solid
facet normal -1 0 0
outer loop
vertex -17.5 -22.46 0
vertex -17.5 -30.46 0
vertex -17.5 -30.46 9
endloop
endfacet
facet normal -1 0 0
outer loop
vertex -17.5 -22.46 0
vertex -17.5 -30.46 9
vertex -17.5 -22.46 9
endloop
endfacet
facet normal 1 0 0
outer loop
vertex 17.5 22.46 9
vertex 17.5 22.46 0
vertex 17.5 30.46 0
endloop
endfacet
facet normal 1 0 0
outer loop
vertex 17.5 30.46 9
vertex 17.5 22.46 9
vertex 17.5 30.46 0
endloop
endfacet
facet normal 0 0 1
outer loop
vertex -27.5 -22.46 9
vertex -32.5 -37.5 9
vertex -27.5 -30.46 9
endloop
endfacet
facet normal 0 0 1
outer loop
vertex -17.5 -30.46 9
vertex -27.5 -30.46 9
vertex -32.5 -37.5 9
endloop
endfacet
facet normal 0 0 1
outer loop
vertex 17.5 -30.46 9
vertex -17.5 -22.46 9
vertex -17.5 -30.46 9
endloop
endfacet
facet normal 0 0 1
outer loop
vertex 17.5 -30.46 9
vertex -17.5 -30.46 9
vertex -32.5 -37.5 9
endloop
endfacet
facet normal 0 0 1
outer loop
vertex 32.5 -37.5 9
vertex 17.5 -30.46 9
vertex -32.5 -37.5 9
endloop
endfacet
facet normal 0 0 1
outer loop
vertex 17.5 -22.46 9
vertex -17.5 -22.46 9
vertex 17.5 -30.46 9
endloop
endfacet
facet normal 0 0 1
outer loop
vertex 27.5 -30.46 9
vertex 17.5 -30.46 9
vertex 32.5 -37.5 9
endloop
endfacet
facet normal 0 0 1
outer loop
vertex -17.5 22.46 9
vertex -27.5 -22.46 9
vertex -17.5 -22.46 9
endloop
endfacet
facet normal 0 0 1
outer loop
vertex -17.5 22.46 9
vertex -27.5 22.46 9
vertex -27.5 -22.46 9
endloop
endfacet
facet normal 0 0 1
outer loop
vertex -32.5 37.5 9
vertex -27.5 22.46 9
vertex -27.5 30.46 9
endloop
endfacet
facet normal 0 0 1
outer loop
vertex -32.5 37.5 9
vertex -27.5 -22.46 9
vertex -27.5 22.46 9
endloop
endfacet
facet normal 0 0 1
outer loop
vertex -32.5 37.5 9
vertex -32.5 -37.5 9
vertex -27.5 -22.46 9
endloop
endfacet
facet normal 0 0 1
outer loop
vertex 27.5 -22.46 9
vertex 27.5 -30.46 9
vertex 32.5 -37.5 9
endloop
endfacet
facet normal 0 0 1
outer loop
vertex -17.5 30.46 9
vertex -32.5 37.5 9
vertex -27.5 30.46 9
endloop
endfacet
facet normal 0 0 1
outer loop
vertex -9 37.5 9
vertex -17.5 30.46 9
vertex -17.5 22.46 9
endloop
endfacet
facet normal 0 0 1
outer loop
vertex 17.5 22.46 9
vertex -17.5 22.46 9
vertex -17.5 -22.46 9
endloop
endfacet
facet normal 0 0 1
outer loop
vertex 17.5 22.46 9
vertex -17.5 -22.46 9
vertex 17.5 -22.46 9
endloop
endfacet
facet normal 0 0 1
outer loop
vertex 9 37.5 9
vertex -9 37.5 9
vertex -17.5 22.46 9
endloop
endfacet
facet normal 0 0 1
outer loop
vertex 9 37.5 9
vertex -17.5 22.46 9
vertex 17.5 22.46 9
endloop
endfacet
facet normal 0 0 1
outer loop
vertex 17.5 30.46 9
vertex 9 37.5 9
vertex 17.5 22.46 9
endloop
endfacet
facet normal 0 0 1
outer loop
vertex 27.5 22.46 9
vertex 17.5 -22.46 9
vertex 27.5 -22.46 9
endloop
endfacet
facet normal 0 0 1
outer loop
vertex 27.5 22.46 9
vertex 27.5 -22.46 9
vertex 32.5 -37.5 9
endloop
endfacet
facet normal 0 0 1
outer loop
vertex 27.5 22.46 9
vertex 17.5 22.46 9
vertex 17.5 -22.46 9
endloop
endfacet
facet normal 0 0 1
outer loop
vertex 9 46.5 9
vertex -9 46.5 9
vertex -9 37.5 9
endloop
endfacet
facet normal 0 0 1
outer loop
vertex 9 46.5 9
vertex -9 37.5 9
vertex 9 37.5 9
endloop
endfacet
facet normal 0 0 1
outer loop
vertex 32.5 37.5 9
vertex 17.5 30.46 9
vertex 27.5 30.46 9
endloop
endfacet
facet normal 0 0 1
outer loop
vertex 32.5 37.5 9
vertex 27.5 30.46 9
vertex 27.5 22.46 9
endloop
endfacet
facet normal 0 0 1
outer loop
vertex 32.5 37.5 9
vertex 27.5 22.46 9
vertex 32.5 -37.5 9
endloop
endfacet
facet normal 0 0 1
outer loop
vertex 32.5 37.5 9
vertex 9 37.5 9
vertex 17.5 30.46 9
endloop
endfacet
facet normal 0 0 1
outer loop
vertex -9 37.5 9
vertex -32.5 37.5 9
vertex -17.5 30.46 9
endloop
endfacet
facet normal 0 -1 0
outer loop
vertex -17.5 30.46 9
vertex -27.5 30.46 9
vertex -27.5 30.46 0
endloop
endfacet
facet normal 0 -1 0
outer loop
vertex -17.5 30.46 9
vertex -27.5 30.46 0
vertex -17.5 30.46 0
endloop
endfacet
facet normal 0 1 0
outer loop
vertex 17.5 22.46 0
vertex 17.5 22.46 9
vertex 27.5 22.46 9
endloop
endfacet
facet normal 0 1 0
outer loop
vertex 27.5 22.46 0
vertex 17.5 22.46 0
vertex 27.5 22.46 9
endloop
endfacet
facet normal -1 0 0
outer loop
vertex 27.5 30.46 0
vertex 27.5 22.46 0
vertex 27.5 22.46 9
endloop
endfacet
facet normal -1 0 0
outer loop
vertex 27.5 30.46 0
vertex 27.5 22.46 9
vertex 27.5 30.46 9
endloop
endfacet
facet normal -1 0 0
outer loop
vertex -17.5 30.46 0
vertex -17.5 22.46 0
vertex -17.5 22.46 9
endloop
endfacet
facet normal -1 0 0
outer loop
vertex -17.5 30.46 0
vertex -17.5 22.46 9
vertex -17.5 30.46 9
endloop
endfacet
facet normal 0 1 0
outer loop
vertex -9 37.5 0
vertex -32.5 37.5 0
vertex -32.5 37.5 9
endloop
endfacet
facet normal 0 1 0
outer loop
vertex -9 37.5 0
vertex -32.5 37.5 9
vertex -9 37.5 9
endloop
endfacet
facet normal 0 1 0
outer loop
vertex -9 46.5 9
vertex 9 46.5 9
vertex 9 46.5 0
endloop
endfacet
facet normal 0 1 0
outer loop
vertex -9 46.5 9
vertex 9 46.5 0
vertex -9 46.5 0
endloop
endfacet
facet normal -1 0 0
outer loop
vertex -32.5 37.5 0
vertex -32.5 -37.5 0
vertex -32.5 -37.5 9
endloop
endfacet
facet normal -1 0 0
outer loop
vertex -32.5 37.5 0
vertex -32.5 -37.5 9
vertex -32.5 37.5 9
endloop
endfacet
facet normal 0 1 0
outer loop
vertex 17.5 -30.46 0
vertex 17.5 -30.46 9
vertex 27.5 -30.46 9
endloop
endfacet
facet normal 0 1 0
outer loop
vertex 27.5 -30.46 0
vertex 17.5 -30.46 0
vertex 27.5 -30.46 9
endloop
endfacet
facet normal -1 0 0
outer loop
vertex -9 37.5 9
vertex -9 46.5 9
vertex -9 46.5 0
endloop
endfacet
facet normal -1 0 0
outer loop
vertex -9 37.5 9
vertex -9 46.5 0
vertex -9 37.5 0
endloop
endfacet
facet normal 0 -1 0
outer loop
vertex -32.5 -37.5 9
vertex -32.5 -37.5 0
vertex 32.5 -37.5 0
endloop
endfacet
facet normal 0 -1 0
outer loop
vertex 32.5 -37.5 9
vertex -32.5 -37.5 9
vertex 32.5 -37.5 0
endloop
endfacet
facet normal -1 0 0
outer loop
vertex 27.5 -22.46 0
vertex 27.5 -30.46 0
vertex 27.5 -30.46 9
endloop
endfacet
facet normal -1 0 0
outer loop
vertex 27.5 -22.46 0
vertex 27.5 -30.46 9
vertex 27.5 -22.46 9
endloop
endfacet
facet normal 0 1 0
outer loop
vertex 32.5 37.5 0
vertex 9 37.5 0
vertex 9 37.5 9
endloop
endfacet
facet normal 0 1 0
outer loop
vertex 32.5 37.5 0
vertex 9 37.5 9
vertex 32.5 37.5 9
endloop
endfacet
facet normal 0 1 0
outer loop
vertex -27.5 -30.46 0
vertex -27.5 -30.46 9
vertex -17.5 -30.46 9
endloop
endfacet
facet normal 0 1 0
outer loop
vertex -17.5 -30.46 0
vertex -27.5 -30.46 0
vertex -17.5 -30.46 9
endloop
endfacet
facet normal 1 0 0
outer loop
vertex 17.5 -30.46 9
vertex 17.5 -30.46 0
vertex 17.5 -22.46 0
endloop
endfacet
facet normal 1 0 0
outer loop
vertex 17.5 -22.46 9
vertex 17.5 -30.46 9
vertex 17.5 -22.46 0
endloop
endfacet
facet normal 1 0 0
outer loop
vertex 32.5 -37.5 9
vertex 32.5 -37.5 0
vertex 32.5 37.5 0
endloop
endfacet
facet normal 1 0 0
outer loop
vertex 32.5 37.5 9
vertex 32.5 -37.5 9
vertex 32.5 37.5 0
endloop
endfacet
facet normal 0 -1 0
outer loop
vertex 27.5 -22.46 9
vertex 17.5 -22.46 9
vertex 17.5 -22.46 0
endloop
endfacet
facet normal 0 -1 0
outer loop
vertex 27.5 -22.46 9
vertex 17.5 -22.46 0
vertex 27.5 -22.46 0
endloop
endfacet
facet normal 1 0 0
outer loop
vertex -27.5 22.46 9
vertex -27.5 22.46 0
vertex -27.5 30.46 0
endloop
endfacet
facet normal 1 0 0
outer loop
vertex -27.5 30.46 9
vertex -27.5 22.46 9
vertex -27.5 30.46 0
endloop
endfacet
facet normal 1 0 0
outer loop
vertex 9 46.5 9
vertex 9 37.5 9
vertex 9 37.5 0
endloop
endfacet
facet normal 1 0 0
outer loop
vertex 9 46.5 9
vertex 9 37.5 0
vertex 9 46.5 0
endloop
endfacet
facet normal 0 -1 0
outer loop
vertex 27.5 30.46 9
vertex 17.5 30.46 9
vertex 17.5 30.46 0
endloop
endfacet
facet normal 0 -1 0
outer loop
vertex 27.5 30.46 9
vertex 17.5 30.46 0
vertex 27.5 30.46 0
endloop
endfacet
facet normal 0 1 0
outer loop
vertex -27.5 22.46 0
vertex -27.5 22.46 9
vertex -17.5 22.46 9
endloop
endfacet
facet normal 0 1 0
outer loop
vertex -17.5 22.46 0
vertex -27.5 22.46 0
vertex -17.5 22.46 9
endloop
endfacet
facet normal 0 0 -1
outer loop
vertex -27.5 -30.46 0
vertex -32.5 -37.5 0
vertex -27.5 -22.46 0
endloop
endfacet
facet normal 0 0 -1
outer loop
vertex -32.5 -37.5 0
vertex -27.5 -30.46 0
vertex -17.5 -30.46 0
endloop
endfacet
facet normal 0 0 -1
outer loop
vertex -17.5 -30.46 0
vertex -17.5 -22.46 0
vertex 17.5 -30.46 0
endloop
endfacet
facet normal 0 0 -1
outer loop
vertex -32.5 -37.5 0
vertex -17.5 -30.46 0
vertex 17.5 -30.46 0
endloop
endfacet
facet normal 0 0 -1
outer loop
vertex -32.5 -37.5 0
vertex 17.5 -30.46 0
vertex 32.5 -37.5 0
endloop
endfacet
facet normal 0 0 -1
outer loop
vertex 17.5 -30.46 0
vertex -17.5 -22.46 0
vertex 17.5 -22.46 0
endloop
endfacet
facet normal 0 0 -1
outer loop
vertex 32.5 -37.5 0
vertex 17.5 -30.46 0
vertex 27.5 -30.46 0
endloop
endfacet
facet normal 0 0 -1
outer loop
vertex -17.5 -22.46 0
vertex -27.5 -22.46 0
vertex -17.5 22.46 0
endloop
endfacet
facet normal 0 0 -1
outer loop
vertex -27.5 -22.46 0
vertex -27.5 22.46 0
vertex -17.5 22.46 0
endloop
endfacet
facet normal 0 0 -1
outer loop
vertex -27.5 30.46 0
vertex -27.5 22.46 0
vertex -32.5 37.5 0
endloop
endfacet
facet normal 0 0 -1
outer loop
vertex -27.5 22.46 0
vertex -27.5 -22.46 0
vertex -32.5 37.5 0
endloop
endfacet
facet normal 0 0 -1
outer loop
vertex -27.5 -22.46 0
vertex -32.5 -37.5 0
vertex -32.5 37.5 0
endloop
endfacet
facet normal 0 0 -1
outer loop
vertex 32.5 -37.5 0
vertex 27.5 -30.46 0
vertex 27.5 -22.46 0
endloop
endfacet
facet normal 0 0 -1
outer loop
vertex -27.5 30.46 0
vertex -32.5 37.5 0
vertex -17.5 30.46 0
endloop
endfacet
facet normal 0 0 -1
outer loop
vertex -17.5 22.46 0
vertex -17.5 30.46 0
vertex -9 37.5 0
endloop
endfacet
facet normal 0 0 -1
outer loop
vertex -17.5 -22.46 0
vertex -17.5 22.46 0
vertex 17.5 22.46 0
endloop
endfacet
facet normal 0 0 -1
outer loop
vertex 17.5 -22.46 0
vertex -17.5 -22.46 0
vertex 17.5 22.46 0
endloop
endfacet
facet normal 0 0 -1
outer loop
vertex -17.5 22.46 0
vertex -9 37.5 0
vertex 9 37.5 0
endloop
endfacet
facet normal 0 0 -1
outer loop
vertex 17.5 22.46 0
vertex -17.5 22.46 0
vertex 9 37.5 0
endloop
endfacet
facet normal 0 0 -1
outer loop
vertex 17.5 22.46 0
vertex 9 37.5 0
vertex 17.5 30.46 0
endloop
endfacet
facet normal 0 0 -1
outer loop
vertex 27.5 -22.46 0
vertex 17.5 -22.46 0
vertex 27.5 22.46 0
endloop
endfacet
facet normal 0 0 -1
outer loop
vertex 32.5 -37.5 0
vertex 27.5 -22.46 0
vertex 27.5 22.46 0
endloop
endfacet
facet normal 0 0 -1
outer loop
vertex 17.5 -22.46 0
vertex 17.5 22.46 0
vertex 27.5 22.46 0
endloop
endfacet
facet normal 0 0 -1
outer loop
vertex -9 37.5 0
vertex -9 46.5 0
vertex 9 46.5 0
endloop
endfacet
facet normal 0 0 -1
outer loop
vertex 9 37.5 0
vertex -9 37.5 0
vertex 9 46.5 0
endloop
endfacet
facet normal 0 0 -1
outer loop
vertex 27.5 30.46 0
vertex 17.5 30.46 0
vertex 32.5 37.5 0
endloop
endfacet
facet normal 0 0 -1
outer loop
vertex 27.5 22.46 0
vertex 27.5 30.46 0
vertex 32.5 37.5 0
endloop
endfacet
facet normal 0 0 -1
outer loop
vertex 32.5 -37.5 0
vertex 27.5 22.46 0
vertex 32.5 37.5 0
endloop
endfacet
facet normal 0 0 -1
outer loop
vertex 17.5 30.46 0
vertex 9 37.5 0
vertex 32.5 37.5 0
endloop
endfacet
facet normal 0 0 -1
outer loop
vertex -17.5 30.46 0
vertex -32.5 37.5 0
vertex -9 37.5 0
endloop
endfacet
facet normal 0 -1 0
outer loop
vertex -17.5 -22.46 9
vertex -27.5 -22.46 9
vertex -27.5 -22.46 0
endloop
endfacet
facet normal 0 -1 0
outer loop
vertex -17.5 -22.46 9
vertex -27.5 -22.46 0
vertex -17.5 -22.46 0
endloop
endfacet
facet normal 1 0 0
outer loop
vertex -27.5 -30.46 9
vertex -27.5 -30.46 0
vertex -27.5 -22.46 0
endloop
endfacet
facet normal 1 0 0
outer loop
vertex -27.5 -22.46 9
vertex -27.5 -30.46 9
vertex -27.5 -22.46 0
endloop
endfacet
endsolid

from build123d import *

# Parameters (mm, degrees)
F0_W     = 65
F0_H     = 75
F1_DEPTH = 9
F3_DEPTH = 9
F4_W     = 10
F4_H     = 8
F5_DEPTH = 9.001


with BuildPart() as f1:
    # F0 (on Top) → F1 (new body)
    with BuildSketch(Plane.XY):
        Rectangle(F0_W, F0_H)
    extrude(amount=F1_DEPTH)

    # F2 (on face) → F3 (join, through all)
    with BuildSketch(Plane.XY.offset(9)):
        Polygon((9, 46.5), (0, 46.5), (-9, 46.5), (-9, 37.5), (0, 37.5), (9, 37.5), align=None)
    extrude(amount=-F3_DEPTH)

    # F4 (on face) → F5 (cut, through all)
    with BuildSketch(Plane.XY.offset(9)):
        with Locations((-22.5, 26.4595)):
            Rectangle(F4_W, F4_H)
        with Locations((22.5, 26.4595)):
            Rectangle(F4_W, F4_H)
        with Locations((22.5, -26.4595)):
            Rectangle(F4_W, F4_H)
        with Locations((-22.5, -26.4595)):
            Rectangle(F4_W, F4_H)
    extrude(amount=-F5_DEPTH, mode=Mode.SUBTRACT)


solid = f1.part
